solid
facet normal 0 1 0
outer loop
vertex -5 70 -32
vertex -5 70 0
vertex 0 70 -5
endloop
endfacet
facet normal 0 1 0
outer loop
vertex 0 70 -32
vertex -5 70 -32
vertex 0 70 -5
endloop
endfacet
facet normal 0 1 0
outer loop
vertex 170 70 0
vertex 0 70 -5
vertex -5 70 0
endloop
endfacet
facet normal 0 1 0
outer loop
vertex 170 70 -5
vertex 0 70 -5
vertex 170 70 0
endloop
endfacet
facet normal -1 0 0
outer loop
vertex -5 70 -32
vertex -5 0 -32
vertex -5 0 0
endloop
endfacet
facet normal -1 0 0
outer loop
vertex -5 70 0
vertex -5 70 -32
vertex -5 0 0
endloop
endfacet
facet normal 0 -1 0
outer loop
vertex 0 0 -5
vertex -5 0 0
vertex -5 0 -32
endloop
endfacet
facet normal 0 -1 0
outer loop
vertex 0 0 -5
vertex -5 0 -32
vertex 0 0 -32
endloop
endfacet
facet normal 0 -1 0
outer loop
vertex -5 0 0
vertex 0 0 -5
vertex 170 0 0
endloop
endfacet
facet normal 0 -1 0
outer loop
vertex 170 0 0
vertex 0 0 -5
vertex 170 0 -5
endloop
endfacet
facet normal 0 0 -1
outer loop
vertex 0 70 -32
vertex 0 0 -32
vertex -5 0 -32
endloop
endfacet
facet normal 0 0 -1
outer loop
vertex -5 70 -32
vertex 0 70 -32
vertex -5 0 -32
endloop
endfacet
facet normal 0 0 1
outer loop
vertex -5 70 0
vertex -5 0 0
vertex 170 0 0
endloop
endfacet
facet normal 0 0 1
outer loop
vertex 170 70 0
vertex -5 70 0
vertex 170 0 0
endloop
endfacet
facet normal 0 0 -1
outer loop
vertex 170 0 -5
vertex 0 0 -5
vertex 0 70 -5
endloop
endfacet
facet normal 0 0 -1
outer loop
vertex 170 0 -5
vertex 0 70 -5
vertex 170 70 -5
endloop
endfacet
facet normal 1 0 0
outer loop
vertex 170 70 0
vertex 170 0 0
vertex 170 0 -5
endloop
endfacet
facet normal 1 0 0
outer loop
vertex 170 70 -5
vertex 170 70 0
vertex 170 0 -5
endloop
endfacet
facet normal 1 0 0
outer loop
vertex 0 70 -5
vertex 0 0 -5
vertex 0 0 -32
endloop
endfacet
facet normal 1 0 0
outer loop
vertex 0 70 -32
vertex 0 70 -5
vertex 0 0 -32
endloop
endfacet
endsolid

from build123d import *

# Parameters (mm, degrees)
SKETCH2_W           = 170
SKETCH2_H           = 5
BOSS_EXTRUDE1_DEPTH = 70


with BuildPart() as part:
    # Sketch2 → Boss-Extrude1 (new body)
    with BuildSketch(Plane(origin=(0, 0, 0), x_dir=(1, 0, 0), z_dir=(0, 1, 0))):
        with Locations((85, 2.5)):
            Rectangle(SKETCH2_W, SKETCH2_H)
        Polygon((-5, 0), (0, 0), (0, 5), (0, 32), (-5, 32), align=None)
    extrude(amount=BOSS_EXTRUDE1_DEPTH)


solid = part.part
